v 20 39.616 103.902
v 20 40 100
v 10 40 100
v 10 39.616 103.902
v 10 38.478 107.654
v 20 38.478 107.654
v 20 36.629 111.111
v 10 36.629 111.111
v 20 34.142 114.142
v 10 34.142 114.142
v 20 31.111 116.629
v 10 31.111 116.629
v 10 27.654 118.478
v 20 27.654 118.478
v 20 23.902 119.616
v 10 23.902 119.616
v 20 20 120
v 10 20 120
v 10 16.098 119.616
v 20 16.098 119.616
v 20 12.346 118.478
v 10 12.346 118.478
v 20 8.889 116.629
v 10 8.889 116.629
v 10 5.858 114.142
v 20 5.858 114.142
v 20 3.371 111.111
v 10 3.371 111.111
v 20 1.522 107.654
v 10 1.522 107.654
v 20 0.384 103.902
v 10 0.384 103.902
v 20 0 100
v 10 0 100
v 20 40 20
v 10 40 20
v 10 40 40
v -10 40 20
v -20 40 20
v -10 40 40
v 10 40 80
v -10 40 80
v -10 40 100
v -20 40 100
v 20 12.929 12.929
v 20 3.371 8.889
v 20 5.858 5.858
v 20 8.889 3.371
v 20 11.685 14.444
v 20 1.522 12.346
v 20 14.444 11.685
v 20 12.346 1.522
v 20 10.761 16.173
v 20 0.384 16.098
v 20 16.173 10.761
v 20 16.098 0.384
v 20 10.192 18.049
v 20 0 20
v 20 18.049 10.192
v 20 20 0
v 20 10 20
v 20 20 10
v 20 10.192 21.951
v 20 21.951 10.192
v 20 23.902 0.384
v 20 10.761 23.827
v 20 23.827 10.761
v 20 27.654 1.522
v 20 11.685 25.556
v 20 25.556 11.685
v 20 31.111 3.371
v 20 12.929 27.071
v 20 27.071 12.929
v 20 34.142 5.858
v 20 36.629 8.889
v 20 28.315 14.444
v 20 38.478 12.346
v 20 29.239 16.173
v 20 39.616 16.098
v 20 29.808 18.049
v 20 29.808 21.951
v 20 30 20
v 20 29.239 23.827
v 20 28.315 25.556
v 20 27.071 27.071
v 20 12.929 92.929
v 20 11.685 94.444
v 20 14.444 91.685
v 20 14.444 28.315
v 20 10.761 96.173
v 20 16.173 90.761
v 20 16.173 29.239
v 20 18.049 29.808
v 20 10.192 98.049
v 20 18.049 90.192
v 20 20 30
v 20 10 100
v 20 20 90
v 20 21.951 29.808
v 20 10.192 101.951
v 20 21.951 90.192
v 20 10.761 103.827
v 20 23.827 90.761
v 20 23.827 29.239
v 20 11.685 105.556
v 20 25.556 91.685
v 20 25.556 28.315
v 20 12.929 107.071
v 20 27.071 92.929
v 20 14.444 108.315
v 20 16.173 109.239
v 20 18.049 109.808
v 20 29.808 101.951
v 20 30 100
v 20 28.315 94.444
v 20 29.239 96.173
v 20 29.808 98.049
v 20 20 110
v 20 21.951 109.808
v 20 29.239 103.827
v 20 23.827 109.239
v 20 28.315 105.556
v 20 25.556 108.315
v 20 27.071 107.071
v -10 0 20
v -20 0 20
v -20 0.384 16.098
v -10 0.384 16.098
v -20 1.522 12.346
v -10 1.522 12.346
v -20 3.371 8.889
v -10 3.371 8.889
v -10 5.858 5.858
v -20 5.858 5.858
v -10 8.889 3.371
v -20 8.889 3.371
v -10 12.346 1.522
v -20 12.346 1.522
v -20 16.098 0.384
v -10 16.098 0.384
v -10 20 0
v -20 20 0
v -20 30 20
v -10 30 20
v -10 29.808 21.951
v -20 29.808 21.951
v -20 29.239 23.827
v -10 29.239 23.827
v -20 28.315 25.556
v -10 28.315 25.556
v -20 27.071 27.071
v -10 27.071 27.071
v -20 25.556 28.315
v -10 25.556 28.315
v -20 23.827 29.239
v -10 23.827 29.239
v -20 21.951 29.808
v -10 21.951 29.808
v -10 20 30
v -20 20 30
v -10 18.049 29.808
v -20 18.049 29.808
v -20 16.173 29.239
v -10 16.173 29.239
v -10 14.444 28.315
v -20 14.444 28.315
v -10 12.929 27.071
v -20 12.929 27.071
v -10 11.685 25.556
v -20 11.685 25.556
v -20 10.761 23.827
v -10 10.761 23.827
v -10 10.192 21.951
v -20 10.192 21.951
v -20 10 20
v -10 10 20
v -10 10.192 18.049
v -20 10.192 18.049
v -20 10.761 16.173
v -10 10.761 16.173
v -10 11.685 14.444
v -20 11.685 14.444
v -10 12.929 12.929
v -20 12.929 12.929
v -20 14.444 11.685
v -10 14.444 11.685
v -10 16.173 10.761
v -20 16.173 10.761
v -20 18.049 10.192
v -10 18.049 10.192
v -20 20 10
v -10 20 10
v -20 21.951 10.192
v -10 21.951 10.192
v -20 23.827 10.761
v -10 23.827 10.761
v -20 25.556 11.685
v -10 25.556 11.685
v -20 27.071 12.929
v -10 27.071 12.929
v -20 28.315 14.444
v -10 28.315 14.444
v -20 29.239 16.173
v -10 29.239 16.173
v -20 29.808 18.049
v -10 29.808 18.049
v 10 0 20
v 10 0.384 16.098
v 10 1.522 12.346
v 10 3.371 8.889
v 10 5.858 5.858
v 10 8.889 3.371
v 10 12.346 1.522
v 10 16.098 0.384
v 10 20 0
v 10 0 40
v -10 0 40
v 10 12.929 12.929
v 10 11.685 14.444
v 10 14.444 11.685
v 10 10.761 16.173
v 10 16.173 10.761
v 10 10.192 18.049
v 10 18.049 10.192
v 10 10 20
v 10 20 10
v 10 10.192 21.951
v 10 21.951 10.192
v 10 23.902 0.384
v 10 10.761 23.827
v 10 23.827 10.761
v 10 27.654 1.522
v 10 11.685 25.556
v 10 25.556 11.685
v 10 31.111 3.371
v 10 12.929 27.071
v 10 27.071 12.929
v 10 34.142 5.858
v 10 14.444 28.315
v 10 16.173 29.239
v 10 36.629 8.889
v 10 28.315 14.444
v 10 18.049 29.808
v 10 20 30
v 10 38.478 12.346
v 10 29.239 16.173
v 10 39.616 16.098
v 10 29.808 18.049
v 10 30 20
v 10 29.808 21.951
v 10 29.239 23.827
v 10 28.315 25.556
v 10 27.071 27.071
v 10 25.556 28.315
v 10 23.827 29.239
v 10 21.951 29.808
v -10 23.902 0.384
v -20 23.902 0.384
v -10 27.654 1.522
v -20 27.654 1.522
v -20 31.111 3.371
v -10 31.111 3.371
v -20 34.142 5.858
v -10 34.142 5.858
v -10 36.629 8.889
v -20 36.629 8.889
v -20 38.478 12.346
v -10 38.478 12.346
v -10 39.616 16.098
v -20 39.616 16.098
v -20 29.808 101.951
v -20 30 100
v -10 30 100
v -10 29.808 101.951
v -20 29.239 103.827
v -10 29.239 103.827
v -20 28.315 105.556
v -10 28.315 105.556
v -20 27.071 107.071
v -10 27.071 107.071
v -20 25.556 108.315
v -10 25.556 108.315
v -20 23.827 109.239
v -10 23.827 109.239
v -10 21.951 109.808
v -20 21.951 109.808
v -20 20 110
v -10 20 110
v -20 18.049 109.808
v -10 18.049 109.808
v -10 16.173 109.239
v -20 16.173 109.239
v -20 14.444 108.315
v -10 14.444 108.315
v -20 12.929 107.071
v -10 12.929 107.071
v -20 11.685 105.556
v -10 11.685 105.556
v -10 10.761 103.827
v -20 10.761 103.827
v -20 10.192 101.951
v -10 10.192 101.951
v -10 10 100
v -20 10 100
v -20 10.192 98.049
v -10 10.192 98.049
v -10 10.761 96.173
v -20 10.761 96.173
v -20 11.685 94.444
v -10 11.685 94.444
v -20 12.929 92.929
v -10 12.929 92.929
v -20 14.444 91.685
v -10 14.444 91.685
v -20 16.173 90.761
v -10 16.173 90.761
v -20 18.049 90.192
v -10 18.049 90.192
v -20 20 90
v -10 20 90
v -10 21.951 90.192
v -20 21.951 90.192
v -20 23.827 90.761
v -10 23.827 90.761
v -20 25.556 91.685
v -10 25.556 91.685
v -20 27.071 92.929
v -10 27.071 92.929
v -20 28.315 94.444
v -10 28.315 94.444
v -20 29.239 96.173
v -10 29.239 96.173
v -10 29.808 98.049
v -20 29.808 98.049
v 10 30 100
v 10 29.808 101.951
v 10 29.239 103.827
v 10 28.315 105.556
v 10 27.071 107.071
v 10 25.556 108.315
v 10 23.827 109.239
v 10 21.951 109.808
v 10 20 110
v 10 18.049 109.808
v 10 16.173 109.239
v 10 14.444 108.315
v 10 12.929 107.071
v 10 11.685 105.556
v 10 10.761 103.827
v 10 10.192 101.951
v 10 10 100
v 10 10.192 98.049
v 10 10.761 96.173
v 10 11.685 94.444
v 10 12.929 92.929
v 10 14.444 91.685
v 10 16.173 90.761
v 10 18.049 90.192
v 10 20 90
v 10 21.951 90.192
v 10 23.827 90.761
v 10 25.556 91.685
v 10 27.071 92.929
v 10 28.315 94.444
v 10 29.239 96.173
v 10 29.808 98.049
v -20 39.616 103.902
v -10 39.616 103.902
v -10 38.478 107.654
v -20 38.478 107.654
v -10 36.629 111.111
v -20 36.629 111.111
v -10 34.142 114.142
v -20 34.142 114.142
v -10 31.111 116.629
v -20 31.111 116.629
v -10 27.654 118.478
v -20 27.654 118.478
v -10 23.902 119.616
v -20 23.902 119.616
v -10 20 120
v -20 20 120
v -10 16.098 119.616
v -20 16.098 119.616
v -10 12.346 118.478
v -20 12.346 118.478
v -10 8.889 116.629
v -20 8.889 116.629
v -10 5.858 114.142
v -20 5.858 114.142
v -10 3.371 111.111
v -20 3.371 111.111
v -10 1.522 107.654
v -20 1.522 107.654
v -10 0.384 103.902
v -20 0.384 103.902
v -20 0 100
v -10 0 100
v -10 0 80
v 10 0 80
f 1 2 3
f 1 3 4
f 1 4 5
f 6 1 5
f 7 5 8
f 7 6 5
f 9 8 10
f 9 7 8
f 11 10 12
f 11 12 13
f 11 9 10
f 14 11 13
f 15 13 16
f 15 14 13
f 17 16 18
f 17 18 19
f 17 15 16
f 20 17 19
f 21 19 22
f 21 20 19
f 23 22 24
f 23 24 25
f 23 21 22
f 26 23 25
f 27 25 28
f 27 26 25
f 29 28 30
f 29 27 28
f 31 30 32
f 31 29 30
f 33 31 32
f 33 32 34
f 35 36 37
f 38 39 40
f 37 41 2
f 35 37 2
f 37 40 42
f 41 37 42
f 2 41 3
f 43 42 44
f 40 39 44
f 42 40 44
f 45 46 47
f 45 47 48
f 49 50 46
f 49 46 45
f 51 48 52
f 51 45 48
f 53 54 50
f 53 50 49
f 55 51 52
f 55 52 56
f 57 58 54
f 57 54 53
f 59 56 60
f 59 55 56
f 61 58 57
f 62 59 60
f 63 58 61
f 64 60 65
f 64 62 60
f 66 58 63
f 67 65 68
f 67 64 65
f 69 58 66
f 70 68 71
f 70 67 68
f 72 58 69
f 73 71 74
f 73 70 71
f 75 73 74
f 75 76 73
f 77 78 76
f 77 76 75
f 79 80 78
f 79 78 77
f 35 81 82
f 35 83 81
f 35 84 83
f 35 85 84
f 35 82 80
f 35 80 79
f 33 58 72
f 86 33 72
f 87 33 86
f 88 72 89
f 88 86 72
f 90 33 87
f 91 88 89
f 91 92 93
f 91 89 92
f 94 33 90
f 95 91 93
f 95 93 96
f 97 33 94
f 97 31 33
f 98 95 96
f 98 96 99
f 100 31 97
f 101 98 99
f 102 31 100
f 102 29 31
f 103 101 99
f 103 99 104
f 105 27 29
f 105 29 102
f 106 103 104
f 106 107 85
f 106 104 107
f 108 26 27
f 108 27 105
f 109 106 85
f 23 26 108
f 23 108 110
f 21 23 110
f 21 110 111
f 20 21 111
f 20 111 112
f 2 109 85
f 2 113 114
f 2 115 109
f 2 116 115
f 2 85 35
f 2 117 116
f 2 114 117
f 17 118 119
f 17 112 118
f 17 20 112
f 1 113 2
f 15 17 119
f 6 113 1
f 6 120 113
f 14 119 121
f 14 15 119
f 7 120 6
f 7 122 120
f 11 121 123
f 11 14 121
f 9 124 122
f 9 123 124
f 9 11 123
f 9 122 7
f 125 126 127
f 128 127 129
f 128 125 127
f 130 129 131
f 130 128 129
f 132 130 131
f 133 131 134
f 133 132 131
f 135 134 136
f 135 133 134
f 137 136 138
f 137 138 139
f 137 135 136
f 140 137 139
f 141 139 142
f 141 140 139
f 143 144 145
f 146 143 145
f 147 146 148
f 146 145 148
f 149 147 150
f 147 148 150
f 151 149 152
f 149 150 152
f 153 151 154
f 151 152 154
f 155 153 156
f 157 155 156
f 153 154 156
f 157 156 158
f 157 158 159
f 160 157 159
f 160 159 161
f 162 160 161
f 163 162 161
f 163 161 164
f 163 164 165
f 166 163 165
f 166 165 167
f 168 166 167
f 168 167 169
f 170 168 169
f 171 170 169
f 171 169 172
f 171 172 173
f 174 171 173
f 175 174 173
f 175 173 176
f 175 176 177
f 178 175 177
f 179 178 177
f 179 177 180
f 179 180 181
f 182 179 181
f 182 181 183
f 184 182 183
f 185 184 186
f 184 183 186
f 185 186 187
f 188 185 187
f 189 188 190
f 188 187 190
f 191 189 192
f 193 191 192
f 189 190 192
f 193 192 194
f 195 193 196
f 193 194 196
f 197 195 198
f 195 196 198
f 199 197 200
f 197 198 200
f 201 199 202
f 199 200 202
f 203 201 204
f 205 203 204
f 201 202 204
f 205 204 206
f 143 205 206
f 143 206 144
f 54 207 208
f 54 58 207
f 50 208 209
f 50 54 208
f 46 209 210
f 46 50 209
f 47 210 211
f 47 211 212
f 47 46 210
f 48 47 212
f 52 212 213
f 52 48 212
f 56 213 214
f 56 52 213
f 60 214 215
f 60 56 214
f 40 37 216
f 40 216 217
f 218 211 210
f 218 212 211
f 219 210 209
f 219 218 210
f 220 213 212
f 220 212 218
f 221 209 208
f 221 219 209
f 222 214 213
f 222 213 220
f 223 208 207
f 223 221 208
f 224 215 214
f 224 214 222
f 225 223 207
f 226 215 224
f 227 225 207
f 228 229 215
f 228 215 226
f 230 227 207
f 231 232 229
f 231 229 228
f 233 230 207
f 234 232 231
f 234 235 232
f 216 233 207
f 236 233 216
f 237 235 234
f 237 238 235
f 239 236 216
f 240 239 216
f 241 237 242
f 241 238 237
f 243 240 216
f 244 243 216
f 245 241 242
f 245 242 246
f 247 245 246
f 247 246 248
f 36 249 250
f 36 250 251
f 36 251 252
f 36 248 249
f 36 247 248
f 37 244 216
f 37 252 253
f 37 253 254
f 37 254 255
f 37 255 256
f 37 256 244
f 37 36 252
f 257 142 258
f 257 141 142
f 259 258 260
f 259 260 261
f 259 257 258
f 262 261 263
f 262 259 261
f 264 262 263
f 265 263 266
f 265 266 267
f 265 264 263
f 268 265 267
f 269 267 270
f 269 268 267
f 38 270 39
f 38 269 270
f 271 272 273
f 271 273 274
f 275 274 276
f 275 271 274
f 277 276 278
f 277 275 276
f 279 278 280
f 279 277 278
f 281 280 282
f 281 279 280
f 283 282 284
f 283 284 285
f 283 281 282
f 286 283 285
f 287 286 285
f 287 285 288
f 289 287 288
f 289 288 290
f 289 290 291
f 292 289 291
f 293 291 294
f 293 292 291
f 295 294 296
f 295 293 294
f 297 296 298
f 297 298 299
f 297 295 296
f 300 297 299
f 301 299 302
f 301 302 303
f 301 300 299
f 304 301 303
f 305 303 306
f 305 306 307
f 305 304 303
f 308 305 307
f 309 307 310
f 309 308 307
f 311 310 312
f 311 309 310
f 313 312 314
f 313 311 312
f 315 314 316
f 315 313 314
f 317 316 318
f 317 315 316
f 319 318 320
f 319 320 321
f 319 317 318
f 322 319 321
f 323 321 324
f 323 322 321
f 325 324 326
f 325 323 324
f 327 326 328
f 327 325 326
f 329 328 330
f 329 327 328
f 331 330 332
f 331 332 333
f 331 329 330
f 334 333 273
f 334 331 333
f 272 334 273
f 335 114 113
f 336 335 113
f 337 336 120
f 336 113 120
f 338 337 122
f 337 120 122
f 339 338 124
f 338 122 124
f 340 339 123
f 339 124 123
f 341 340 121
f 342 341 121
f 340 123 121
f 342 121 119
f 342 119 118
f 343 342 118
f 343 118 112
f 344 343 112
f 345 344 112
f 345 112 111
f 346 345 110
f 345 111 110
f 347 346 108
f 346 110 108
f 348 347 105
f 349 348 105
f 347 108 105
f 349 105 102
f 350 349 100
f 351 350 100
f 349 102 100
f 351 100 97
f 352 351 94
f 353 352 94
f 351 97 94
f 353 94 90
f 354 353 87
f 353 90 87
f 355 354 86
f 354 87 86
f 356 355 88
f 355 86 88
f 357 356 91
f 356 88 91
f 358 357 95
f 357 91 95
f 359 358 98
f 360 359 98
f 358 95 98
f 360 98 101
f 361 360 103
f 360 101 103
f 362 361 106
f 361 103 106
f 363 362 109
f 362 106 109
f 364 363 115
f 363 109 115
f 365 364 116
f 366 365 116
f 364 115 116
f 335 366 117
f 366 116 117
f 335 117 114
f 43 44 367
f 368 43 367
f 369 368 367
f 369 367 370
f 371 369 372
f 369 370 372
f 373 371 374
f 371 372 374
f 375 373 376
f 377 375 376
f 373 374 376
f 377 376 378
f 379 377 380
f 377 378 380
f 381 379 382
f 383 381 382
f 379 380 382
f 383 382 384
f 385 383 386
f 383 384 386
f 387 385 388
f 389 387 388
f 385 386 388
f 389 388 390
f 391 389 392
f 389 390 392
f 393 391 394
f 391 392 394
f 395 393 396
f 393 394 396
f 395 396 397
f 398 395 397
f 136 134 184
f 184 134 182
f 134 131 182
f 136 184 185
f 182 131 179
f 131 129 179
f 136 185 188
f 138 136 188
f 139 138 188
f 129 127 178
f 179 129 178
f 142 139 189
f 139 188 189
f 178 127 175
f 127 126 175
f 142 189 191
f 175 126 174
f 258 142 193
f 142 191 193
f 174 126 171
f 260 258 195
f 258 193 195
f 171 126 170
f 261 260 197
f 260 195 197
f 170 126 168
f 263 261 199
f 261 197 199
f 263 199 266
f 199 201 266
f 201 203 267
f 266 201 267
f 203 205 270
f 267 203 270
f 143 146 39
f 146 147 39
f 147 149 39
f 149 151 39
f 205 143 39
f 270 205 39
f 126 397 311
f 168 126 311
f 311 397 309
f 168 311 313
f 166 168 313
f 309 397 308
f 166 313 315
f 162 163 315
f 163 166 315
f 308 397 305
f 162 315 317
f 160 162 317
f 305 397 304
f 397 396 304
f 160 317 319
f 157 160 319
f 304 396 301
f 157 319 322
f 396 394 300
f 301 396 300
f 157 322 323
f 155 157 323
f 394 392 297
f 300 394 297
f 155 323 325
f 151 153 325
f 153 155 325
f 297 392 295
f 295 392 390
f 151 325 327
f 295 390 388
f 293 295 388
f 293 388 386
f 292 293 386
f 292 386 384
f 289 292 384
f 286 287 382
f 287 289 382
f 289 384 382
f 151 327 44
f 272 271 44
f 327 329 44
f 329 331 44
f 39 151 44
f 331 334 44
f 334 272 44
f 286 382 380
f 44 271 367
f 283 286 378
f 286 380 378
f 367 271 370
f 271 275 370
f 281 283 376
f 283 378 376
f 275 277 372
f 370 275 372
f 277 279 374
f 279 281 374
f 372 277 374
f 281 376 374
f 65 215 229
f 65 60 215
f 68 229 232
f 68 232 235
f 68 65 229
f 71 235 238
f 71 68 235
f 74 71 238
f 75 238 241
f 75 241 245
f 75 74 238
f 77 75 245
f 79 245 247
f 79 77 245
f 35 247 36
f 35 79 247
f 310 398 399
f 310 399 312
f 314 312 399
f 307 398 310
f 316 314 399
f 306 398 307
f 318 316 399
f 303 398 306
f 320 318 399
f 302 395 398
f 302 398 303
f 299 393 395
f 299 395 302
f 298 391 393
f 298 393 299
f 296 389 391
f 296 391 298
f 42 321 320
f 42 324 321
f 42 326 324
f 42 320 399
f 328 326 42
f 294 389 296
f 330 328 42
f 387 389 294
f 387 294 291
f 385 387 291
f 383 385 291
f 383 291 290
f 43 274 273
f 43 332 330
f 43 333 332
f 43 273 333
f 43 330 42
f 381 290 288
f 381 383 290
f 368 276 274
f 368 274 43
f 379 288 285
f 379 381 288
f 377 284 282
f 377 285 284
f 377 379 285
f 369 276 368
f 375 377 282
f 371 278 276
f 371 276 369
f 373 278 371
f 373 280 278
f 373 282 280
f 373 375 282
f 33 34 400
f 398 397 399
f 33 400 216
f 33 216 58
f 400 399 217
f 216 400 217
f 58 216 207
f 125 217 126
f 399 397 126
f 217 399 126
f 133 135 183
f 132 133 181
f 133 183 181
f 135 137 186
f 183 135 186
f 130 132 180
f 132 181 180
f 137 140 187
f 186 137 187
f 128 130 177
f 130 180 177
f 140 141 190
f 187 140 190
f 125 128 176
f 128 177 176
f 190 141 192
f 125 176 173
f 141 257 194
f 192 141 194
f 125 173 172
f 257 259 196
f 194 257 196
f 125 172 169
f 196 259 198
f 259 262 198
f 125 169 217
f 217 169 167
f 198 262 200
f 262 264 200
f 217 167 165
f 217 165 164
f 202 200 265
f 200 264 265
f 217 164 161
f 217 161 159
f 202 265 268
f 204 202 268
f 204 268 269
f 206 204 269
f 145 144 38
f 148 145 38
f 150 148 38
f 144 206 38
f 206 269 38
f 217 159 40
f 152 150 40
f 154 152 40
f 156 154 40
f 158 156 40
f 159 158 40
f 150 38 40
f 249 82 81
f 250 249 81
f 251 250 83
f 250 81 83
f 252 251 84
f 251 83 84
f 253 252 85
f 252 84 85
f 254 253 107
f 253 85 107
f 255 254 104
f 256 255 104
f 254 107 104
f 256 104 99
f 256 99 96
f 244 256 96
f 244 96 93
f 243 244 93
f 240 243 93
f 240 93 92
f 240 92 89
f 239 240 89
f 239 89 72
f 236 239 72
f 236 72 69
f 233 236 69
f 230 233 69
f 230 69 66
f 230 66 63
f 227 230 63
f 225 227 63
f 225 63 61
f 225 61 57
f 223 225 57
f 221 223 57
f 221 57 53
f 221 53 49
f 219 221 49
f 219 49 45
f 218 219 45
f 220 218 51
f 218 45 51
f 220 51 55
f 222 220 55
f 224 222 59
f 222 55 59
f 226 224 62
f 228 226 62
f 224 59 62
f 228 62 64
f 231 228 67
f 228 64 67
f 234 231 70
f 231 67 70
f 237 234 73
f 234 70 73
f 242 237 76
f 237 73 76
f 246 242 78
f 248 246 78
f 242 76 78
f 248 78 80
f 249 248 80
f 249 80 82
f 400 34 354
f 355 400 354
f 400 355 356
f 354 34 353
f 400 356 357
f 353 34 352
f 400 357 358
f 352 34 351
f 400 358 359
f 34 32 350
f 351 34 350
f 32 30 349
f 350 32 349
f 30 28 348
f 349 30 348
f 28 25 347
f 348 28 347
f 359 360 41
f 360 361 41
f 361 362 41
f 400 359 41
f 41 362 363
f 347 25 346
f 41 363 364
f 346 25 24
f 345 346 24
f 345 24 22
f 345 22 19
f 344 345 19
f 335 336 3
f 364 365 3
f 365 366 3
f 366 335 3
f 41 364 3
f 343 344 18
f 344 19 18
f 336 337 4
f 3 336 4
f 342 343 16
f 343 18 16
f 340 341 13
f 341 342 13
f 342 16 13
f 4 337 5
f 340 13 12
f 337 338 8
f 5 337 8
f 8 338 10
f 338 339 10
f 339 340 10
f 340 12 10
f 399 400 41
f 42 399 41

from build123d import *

# Parameters (mm, degrees)
F0_W     = 40
F0_H     = 80
F1_DEPTH = 20
F2_R     = 10
F3_DEPTH = 10
F5_W     = 20
F5_H     = 40
F6_DEPTH = 40
F7_R     = 10
F8_DEPTH = 40
F9_R     = 20
F10_R    = 19.99999


# Not quite as in the source:
# - a fillet or chamfer is up to 0.001 mm smaller than in the source, because OpenCascade refuses the exact size


with BuildPart() as f1:
    # F0 (on Right) → F1 (new body)
    with BuildSketch(Plane.YZ):
        with Locations((20, 40)):
            Rectangle(F0_W, F0_H)
    extrude(amount=F1_DEPTH)

    # F2 (on face) → F3 (join)
    with BuildSketch(Plane.YZ.offset(20)):
        with BuildLine():
            Line((0, 100), (0, 80))
            Line((0, 80), (40, 80))
            Line((40, 80), (40, 100))
            ThreePointArc((40, 100), (20, 120), (0, 100))
        make_face()
        with Locations((20, 100)):
            Circle(F2_R, mode=Mode.SUBTRACT)
    extrude(amount=-F3_DEPTH)

    # F4: F1 across face


with BuildPart() as f1_1:
    add(f1.part)
    add(f1.part.mirror(Plane(origin=(0, 20, 40), x_dir=(0, 1, 0), z_dir=(-1, 0, 0))))

    # F5 (on face) → F6 (cut, through all)
    with BuildSketch(Plane(origin=(0, 40, 0), x_dir=(-1, 0, 0), z_dir=(0, 1, 0))):
        with Locations((0, 20)):
            Rectangle(F5_W, F5_H)
    extrude(amount=-F6_DEPTH, mode=Mode.SUBTRACT)

    # F7 (on face) → F8 (cut, through all)
    with BuildSketch(Plane.YZ.offset(20)):
        with Locations((20, 20)):
            Circle(F7_R)
    extrude(amount=-F8_DEPTH, mode=Mode.SUBTRACT)

    # F9
    f9_edges = [f1_1.edges().sort_by_distance(p)[0] for p in [
        (-15, 0, 0),
    ]]
    fillet(f9_edges, radius=F9_R)

    # F10 (radius 20 in the source; OpenCascade refuses exactly that, so slightly less here)
    f10_edges = [f1_1.edges().sort_by_distance(p)[0] for p in [
        (-15, 40, 0),
        (15, 40, 0),
        (15, 0, 0),
    ]]
    fillet(f10_edges, radius=F10_R)


solid = f1_1.part
